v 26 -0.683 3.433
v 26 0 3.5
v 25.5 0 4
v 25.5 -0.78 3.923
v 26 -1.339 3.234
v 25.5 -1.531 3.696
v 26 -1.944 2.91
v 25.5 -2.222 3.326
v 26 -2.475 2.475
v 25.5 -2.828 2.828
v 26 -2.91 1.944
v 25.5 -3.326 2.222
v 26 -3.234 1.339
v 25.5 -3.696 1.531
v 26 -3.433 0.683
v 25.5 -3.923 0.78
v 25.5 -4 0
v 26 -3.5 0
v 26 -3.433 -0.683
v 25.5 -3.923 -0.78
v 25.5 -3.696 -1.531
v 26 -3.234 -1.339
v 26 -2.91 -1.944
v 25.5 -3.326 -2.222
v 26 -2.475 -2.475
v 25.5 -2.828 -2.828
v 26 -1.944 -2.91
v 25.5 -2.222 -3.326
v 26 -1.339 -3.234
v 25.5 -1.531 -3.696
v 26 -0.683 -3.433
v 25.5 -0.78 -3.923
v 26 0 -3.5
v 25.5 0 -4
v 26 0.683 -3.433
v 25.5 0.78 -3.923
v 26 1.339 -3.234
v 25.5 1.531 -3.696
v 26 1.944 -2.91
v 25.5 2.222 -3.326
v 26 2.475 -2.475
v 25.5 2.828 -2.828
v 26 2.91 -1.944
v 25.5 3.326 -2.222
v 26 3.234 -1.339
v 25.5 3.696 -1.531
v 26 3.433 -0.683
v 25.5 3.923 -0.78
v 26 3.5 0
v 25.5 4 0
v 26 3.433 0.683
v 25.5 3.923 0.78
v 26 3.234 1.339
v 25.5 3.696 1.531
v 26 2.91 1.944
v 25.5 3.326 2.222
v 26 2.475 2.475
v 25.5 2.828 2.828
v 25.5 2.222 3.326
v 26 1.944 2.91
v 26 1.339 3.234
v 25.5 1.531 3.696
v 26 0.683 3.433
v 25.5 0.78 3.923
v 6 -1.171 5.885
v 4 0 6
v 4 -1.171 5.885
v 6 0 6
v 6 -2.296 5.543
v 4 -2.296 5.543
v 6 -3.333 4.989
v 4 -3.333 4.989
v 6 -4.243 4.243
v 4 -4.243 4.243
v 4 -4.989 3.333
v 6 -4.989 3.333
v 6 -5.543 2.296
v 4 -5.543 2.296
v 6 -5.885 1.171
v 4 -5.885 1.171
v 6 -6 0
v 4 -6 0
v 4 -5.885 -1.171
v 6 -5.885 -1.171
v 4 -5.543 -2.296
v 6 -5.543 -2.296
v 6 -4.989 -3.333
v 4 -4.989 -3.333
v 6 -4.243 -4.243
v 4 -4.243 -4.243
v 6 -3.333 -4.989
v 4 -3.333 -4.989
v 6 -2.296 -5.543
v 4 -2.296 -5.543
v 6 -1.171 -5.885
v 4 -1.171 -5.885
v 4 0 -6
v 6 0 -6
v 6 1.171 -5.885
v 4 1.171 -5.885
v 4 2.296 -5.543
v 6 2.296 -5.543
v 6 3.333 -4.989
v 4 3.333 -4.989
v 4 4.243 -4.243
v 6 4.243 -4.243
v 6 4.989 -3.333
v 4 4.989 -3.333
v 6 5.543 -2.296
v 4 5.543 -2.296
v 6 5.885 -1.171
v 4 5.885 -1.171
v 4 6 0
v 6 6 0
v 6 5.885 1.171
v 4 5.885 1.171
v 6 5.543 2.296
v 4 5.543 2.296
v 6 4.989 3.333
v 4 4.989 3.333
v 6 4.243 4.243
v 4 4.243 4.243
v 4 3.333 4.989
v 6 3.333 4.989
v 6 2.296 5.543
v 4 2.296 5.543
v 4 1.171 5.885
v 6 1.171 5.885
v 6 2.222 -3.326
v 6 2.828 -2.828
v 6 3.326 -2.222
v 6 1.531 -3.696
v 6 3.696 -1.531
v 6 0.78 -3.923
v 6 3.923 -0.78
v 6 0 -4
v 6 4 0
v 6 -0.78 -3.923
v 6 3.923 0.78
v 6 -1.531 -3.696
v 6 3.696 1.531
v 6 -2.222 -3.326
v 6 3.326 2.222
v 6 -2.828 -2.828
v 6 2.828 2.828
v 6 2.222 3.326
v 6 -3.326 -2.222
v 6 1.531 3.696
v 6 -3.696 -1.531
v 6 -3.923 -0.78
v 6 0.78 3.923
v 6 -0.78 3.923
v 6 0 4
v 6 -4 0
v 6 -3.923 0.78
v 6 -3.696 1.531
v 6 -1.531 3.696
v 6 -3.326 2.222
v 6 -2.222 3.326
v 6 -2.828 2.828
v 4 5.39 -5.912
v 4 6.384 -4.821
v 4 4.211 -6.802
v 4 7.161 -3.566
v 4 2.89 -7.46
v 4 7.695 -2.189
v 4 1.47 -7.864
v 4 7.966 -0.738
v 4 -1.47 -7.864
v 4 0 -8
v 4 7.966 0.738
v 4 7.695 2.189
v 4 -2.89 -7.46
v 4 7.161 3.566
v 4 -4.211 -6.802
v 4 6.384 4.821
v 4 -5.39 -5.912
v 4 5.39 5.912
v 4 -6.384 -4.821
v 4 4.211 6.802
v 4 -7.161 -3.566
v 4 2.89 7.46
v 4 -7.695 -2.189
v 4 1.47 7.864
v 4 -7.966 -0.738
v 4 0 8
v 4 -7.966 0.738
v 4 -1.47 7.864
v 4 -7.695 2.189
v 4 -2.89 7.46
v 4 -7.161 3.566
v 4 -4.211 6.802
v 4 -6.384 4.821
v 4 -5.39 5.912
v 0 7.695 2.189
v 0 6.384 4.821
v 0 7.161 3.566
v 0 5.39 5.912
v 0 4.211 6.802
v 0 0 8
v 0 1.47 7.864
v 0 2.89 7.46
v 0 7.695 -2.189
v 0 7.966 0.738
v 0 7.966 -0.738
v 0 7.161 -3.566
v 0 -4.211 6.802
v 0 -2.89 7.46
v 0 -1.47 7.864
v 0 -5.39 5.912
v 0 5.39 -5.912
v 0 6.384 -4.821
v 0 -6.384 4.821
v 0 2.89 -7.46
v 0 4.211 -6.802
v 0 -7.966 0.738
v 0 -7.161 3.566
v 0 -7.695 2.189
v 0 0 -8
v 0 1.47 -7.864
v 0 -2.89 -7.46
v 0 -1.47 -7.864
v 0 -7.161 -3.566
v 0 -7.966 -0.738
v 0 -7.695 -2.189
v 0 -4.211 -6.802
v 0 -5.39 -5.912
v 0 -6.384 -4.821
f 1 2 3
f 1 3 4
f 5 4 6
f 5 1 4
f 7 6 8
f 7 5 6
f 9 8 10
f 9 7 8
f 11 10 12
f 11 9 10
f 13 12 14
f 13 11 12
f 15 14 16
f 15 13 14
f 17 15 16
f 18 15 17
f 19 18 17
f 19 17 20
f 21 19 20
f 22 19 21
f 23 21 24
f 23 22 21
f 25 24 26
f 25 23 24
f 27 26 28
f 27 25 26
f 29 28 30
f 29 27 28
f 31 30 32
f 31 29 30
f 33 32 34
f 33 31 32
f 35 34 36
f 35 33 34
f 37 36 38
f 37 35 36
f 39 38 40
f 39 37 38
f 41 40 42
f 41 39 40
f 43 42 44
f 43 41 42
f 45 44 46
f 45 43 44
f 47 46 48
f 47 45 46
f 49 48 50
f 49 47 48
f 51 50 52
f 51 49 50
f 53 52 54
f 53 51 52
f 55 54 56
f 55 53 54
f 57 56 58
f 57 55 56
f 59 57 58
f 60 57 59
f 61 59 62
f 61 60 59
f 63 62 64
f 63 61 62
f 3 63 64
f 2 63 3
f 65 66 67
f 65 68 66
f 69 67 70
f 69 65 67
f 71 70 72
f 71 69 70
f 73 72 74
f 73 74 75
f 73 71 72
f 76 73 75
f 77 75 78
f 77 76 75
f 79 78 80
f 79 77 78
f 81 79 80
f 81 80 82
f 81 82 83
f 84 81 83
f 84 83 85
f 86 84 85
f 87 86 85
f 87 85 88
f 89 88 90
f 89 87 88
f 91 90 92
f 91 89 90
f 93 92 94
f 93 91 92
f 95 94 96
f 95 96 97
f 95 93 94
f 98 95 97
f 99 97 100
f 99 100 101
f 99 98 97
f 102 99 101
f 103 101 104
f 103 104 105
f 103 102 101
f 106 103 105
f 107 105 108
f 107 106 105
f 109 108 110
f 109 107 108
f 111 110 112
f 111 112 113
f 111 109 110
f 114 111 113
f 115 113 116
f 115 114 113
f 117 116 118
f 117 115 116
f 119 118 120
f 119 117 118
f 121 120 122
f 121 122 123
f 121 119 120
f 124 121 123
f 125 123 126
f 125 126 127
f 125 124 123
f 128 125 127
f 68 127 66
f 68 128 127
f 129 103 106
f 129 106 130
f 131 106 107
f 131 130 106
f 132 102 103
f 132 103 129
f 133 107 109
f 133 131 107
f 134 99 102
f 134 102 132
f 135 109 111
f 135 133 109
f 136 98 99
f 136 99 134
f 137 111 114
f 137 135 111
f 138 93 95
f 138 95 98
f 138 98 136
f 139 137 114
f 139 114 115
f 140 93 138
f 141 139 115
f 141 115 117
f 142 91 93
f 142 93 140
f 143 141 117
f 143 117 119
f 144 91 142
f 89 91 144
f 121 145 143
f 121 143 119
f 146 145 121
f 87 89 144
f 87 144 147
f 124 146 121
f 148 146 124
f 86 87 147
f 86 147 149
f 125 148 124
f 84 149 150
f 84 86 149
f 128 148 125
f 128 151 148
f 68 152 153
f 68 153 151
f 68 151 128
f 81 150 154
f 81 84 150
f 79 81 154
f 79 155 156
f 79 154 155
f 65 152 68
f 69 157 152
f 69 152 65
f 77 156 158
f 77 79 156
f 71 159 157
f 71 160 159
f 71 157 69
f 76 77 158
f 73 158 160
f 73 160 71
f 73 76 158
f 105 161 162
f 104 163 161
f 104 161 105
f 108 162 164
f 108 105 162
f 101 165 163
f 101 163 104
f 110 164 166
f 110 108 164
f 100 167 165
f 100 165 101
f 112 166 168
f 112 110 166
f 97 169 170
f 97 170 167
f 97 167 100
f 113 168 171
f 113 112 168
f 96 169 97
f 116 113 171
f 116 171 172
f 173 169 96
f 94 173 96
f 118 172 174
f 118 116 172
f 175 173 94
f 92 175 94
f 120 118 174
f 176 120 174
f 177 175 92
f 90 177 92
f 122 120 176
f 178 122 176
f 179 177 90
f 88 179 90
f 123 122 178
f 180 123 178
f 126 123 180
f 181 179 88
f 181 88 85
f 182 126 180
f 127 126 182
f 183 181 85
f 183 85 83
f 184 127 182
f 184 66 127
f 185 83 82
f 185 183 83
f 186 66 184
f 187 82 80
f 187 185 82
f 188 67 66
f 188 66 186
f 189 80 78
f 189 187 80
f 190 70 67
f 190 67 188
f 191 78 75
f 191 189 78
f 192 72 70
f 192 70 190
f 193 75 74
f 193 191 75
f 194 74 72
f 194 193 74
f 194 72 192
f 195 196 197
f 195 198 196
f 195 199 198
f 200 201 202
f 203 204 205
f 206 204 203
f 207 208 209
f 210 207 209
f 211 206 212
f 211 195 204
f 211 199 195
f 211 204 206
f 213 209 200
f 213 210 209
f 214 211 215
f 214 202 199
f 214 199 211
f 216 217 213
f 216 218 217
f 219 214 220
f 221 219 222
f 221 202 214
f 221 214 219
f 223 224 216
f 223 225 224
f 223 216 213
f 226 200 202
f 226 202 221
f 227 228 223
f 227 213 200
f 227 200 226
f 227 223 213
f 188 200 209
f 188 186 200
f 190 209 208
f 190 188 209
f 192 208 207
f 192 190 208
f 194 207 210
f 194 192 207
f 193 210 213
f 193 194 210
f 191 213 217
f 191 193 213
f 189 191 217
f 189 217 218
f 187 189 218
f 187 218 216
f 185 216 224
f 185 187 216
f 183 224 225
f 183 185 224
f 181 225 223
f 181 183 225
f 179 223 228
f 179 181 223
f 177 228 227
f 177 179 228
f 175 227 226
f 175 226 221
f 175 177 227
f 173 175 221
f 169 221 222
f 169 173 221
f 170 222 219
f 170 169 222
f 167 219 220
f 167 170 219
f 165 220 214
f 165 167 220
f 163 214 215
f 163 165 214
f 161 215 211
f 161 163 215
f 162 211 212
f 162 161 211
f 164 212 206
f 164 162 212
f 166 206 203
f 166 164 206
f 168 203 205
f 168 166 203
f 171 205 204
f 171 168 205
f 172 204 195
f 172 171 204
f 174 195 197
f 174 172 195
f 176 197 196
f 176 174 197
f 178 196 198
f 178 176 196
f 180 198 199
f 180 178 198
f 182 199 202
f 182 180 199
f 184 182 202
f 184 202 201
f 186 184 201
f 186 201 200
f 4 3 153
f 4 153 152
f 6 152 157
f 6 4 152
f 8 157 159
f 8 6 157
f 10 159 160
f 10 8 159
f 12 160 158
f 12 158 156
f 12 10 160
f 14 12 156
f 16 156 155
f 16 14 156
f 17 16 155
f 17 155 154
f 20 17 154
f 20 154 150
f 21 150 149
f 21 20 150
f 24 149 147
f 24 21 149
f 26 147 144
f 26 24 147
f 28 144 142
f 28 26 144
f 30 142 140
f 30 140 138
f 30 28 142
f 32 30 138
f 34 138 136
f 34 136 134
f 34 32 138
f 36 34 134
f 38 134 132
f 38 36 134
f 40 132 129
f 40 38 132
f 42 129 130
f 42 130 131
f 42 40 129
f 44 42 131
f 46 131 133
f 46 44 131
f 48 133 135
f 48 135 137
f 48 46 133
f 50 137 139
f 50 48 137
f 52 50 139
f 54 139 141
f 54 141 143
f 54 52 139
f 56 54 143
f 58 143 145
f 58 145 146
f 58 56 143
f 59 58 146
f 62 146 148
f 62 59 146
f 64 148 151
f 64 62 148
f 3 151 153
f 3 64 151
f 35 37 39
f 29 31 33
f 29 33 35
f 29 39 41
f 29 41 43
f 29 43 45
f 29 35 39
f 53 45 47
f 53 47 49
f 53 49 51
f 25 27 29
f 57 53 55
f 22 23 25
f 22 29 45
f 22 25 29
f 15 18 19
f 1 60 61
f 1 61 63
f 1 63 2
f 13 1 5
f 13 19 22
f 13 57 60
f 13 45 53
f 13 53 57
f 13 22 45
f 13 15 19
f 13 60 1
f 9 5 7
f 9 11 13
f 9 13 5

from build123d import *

# Parameters (mm, degrees)
CHANFREIN1_SIZE = 0.5


with BuildPart() as part:
    # Esquisse1 → Base-Révolution (revolve)
    with BuildSketch(Plane.XY, mode=Mode.PRIVATE) as base_r_volution_sk:
        Polygon((0, 0), (0, 8), (4, 8), (4, 6), (6, 6), (6, 4), (26, 4), (26, 0), align=None)
    revolve(base_r_volution_sk.sketch.rotate(Axis((-4.18019429, 0, 0), (1, 0, 0)), 90), axis=Axis((-4.18019429, 0, 0), (1, 0, 0)))

    # Chanfrein1
    chanfrein1_edges = [part.edges().sort_by_distance(p)[0] for p in [
        (26, 0, -4),
    ]]
    chamfer(chanfrein1_edges, length=CHANFREIN1_SIZE)


solid = part.part
